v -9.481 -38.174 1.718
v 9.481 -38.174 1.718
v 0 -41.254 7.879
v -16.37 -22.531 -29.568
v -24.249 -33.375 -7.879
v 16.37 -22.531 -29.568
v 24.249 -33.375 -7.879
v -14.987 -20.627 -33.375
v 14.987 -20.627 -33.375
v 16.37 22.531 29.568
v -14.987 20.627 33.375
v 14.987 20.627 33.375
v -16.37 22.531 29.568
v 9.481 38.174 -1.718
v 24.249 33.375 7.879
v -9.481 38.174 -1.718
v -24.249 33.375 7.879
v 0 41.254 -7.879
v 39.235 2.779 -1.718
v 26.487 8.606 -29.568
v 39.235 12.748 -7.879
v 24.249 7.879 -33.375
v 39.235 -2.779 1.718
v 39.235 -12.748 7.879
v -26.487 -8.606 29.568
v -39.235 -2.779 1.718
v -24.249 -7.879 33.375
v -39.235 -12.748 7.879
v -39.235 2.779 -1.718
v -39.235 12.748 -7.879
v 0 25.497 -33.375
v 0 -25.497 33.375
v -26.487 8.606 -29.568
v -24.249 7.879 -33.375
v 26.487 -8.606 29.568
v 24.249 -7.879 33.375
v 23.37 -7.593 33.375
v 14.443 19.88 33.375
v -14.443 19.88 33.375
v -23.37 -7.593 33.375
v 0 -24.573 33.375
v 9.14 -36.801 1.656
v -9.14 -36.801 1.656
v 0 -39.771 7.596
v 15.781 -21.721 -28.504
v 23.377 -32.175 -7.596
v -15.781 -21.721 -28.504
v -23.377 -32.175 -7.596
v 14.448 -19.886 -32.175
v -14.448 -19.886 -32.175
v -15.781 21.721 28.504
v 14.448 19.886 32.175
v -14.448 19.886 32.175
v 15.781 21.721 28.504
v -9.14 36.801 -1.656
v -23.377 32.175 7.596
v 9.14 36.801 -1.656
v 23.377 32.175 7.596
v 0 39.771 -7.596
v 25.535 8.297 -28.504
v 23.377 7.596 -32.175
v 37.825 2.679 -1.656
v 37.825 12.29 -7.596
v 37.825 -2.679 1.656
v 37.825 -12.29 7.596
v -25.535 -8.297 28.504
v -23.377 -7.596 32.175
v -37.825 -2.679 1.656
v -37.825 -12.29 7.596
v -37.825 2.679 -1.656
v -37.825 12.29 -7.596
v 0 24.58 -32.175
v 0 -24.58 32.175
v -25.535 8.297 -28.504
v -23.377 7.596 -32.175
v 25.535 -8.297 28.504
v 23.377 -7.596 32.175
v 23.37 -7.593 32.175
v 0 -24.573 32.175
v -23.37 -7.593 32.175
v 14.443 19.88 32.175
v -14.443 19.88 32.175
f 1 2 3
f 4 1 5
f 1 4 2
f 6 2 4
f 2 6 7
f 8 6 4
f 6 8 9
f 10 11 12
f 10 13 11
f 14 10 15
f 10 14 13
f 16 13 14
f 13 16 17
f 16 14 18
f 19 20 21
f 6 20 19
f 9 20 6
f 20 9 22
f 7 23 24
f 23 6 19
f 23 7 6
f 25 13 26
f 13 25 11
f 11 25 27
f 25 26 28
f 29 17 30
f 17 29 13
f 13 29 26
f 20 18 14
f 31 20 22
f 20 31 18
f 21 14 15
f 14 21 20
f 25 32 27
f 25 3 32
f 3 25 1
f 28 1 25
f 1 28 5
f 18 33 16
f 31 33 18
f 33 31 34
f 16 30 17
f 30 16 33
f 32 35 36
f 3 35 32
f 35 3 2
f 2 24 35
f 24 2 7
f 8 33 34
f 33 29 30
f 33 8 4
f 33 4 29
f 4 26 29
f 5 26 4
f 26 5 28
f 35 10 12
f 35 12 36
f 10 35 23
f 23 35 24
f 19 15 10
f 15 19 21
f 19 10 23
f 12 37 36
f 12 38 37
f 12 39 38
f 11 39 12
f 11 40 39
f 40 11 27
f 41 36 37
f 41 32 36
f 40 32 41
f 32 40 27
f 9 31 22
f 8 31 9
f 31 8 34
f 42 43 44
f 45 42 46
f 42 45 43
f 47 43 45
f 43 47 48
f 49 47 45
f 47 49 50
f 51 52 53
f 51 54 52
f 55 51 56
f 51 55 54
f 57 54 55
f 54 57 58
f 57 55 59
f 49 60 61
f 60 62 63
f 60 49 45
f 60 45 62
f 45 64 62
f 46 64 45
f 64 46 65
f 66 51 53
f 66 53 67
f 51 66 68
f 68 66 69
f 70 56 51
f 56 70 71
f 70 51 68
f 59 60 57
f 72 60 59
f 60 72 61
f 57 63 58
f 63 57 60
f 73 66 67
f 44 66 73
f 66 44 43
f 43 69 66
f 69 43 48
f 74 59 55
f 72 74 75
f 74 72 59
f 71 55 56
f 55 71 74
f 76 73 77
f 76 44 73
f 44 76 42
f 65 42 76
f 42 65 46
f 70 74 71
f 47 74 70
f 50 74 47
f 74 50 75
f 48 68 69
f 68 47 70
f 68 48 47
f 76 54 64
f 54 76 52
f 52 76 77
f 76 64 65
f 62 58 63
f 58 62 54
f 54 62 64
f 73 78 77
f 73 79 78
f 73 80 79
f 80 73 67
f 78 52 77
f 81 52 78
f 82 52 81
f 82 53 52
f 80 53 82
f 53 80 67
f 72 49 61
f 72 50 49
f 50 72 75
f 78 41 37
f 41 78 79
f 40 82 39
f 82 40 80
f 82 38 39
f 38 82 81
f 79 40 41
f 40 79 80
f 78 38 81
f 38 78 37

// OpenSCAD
hauteurExt = 66.751;
epaisseurParoi = 1.2;
diametreTrouBouchon = 1.6;
r = 0.19; // résolution d'impression sur l'axe Z
echelleReductionAjustementBouchon = 0.985;
hauteurInt = hauteurExt - 2 * epaisseurParoi;

//dode_creux();
//decoupe_bouchon();
corps_ouvert();
//bouchon_avec_attache();
//bouchon();
//bouchon_trou();

module corps_ouvert() {
	difference() {
		dode_creux();
		decoupe_bouchon();
	}
}

module bouchon_avec_attache() {
	scale([echelleReductionAjustementBouchon, echelleReductionAjustementBouchon, 0.995])
	union () {
		intersection() {
			dode_creux();
			decoupe_bouchon();
		}
		translate([0, 0, hauteurExt/2])
		rotate([90, 0, 54])
		rotate_extrude(convexity = 10, $fn=40)
		translate([1, 0, 0])
		circle(r = 0.5, $fn=40);
	}
}

module bouchon_trou() {
	scale([echelleReductionAjustementBouchon, echelleReductionAjustementBouchon, 1])
	difference () {
		intersection() {
			dode_creux();
			decoupe_bouchon();
		}
		translate([0, 0, hauteurExt/2.5])
		cylinder(30, r=diametreTrouBouchon/2, $fn=22);
	}
}

module bouchon() {
    //rotate([0,180,0])
	scale([echelleReductionAjustementBouchon, echelleReductionAjustementBouchon, 1])
	difference () {
		intersection() {
			dode_creux();
			decoupe_bouchon();
		}
	}
}

module dode_creux() {
	difference() {
		dodecahedron(hauteurExt);
		dodecahedron(hauteurInt);
	}
}

module decoupe_bouchon() {
    distance = hauteurInt/2+4*r;
//	rotate([0,0,54]) translate([0,0,distance])
//		cylinder(epaisseurParoi, r=hauteurExt/2.675, $fn=5);
	rotate([0,0,54]) translate([0,0,distance-epaisseurParoi])
		cylinder(epaisseurParoi*2, r=hauteurExt/2.59-epaisseurParoi, $fn=5);
}

module dodecahedron(height) {
	scale([height,height,height]) {
		intersection() {
			cube([2,2,1], center = true); 
			intersection_for(i=[0:4]) { 
				rotate([0,0,72*i])
				rotate([116.565,0,0])
					cube([2,2,1], center = true); 
			}
		}
	}
}
